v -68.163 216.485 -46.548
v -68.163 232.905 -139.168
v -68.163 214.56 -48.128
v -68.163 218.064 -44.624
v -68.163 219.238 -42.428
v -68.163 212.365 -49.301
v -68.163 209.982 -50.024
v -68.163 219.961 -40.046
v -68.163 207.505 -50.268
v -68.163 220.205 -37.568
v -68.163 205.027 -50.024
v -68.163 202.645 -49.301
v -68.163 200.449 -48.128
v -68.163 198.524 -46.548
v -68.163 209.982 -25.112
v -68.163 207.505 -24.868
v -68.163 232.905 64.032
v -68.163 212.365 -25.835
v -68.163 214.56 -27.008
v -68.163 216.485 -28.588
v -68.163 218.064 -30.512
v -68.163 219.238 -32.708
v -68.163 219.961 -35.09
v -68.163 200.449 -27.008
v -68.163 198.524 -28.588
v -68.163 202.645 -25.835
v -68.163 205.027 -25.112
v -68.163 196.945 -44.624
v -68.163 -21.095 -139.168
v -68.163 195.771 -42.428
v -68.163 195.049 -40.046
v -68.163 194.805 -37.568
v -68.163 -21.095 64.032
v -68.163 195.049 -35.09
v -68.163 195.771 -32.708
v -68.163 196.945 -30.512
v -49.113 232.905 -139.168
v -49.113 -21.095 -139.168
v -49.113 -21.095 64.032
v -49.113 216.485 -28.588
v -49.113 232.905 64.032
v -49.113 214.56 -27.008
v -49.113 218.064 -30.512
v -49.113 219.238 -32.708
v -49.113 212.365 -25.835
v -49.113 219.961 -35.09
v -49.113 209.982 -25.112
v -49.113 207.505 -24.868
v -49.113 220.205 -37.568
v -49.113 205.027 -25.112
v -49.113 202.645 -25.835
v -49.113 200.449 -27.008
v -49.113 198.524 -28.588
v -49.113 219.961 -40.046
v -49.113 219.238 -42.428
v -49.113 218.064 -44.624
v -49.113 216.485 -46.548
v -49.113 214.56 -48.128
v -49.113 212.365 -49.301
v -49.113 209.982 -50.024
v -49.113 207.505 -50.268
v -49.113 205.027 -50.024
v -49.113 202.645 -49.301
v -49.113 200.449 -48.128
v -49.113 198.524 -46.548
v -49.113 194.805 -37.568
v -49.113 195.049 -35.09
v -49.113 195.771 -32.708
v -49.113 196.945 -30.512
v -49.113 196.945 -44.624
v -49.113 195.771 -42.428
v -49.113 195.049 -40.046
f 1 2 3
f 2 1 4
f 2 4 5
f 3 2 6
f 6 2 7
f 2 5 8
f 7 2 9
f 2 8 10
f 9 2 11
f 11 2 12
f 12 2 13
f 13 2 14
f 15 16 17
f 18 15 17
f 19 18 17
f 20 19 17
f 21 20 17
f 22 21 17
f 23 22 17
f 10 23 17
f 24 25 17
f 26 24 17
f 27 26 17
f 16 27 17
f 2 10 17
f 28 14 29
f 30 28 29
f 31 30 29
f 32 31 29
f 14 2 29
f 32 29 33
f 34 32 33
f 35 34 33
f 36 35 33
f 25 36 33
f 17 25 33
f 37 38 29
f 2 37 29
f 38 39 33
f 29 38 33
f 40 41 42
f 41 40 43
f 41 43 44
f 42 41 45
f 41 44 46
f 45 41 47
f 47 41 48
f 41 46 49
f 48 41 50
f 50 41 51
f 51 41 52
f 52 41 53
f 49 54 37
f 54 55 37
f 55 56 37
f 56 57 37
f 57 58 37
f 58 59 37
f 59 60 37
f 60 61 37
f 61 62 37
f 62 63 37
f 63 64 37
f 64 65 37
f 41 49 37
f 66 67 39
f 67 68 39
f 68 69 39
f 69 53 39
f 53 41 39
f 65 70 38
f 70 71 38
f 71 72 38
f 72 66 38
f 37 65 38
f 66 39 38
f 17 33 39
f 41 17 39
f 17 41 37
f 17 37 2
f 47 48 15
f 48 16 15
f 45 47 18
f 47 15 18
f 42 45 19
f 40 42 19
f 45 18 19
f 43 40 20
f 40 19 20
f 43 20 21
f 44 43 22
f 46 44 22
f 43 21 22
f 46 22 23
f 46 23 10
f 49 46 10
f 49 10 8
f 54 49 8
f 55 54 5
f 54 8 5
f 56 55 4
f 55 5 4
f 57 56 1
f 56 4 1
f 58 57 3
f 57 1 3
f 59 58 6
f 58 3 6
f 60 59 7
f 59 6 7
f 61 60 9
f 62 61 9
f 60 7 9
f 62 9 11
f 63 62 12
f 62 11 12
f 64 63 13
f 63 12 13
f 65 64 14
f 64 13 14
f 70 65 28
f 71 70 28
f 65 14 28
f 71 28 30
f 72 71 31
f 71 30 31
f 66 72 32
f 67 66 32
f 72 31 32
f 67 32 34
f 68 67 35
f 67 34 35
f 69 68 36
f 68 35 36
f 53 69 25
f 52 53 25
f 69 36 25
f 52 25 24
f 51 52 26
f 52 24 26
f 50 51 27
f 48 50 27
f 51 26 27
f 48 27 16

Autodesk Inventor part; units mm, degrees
ref_plane "YZ Plane" through (0, 0, 0) normal (1, 0, 0) x (0, 1, 0)
ref_plane "XZ Plane" through (0, 0, 0) normal (0, 1, 0) x (-1, 0, 0)
ref_plane "Work Plane1" through (33.4366, -21.0953, -37.5679) normal (0, 1, 0) x (-1, 0, 0)
sketch "Sketch1" plane through (33.4366, -21.0953, -37.5679) normal (0, 1, 0) x (-1, 0, 0)
  line L0 (101.6, -101.6) -> (101.6, 101.6) projected
  line L1 (101.6, 101.6) -> (-101.6, 101.6) projected
  line L2 (-101.6, -101.6) -> (101.6, -101.6) projected
  line L3 (101.6, 101.6) -> (82.55, 101.6)
  line L4 (82.55, 101.6) -> (82.55, -101.6)
  line L5 (82.55, -101.6) -> (101.6, -101.6)
  line L6 (101.6, -101.6) -> (101.6, 101.6)
  point P0 (33.4366, 37.5679)
  dimension "d0" = 19.05
extrude "Extrusion1" add sketch "Sketch1" along normal blind 254
sketch "Sketch2" plane through (-68.1634, -21.0953, -139.1679) normal (-1, 0, 0) x (0, 0, 1)
  line L0 (203.2, 254) -> (0, 254) construction
  line L1 (101.6, 254) -> (101.6, 0) construction
  line L2 (203.2, 0) -> (0, 0) construction
  circle A0 centre (101.6, 228.6) radius 12.7
  point P0 (139.1679, 21.0953)
  dimension "d3" = 25.4
  dimension "d4" = 25.4
extrude "Extrusion2" cut sketch "Sketch2" against normal through all
properties part number "woodForAssemblyLeftSide"
